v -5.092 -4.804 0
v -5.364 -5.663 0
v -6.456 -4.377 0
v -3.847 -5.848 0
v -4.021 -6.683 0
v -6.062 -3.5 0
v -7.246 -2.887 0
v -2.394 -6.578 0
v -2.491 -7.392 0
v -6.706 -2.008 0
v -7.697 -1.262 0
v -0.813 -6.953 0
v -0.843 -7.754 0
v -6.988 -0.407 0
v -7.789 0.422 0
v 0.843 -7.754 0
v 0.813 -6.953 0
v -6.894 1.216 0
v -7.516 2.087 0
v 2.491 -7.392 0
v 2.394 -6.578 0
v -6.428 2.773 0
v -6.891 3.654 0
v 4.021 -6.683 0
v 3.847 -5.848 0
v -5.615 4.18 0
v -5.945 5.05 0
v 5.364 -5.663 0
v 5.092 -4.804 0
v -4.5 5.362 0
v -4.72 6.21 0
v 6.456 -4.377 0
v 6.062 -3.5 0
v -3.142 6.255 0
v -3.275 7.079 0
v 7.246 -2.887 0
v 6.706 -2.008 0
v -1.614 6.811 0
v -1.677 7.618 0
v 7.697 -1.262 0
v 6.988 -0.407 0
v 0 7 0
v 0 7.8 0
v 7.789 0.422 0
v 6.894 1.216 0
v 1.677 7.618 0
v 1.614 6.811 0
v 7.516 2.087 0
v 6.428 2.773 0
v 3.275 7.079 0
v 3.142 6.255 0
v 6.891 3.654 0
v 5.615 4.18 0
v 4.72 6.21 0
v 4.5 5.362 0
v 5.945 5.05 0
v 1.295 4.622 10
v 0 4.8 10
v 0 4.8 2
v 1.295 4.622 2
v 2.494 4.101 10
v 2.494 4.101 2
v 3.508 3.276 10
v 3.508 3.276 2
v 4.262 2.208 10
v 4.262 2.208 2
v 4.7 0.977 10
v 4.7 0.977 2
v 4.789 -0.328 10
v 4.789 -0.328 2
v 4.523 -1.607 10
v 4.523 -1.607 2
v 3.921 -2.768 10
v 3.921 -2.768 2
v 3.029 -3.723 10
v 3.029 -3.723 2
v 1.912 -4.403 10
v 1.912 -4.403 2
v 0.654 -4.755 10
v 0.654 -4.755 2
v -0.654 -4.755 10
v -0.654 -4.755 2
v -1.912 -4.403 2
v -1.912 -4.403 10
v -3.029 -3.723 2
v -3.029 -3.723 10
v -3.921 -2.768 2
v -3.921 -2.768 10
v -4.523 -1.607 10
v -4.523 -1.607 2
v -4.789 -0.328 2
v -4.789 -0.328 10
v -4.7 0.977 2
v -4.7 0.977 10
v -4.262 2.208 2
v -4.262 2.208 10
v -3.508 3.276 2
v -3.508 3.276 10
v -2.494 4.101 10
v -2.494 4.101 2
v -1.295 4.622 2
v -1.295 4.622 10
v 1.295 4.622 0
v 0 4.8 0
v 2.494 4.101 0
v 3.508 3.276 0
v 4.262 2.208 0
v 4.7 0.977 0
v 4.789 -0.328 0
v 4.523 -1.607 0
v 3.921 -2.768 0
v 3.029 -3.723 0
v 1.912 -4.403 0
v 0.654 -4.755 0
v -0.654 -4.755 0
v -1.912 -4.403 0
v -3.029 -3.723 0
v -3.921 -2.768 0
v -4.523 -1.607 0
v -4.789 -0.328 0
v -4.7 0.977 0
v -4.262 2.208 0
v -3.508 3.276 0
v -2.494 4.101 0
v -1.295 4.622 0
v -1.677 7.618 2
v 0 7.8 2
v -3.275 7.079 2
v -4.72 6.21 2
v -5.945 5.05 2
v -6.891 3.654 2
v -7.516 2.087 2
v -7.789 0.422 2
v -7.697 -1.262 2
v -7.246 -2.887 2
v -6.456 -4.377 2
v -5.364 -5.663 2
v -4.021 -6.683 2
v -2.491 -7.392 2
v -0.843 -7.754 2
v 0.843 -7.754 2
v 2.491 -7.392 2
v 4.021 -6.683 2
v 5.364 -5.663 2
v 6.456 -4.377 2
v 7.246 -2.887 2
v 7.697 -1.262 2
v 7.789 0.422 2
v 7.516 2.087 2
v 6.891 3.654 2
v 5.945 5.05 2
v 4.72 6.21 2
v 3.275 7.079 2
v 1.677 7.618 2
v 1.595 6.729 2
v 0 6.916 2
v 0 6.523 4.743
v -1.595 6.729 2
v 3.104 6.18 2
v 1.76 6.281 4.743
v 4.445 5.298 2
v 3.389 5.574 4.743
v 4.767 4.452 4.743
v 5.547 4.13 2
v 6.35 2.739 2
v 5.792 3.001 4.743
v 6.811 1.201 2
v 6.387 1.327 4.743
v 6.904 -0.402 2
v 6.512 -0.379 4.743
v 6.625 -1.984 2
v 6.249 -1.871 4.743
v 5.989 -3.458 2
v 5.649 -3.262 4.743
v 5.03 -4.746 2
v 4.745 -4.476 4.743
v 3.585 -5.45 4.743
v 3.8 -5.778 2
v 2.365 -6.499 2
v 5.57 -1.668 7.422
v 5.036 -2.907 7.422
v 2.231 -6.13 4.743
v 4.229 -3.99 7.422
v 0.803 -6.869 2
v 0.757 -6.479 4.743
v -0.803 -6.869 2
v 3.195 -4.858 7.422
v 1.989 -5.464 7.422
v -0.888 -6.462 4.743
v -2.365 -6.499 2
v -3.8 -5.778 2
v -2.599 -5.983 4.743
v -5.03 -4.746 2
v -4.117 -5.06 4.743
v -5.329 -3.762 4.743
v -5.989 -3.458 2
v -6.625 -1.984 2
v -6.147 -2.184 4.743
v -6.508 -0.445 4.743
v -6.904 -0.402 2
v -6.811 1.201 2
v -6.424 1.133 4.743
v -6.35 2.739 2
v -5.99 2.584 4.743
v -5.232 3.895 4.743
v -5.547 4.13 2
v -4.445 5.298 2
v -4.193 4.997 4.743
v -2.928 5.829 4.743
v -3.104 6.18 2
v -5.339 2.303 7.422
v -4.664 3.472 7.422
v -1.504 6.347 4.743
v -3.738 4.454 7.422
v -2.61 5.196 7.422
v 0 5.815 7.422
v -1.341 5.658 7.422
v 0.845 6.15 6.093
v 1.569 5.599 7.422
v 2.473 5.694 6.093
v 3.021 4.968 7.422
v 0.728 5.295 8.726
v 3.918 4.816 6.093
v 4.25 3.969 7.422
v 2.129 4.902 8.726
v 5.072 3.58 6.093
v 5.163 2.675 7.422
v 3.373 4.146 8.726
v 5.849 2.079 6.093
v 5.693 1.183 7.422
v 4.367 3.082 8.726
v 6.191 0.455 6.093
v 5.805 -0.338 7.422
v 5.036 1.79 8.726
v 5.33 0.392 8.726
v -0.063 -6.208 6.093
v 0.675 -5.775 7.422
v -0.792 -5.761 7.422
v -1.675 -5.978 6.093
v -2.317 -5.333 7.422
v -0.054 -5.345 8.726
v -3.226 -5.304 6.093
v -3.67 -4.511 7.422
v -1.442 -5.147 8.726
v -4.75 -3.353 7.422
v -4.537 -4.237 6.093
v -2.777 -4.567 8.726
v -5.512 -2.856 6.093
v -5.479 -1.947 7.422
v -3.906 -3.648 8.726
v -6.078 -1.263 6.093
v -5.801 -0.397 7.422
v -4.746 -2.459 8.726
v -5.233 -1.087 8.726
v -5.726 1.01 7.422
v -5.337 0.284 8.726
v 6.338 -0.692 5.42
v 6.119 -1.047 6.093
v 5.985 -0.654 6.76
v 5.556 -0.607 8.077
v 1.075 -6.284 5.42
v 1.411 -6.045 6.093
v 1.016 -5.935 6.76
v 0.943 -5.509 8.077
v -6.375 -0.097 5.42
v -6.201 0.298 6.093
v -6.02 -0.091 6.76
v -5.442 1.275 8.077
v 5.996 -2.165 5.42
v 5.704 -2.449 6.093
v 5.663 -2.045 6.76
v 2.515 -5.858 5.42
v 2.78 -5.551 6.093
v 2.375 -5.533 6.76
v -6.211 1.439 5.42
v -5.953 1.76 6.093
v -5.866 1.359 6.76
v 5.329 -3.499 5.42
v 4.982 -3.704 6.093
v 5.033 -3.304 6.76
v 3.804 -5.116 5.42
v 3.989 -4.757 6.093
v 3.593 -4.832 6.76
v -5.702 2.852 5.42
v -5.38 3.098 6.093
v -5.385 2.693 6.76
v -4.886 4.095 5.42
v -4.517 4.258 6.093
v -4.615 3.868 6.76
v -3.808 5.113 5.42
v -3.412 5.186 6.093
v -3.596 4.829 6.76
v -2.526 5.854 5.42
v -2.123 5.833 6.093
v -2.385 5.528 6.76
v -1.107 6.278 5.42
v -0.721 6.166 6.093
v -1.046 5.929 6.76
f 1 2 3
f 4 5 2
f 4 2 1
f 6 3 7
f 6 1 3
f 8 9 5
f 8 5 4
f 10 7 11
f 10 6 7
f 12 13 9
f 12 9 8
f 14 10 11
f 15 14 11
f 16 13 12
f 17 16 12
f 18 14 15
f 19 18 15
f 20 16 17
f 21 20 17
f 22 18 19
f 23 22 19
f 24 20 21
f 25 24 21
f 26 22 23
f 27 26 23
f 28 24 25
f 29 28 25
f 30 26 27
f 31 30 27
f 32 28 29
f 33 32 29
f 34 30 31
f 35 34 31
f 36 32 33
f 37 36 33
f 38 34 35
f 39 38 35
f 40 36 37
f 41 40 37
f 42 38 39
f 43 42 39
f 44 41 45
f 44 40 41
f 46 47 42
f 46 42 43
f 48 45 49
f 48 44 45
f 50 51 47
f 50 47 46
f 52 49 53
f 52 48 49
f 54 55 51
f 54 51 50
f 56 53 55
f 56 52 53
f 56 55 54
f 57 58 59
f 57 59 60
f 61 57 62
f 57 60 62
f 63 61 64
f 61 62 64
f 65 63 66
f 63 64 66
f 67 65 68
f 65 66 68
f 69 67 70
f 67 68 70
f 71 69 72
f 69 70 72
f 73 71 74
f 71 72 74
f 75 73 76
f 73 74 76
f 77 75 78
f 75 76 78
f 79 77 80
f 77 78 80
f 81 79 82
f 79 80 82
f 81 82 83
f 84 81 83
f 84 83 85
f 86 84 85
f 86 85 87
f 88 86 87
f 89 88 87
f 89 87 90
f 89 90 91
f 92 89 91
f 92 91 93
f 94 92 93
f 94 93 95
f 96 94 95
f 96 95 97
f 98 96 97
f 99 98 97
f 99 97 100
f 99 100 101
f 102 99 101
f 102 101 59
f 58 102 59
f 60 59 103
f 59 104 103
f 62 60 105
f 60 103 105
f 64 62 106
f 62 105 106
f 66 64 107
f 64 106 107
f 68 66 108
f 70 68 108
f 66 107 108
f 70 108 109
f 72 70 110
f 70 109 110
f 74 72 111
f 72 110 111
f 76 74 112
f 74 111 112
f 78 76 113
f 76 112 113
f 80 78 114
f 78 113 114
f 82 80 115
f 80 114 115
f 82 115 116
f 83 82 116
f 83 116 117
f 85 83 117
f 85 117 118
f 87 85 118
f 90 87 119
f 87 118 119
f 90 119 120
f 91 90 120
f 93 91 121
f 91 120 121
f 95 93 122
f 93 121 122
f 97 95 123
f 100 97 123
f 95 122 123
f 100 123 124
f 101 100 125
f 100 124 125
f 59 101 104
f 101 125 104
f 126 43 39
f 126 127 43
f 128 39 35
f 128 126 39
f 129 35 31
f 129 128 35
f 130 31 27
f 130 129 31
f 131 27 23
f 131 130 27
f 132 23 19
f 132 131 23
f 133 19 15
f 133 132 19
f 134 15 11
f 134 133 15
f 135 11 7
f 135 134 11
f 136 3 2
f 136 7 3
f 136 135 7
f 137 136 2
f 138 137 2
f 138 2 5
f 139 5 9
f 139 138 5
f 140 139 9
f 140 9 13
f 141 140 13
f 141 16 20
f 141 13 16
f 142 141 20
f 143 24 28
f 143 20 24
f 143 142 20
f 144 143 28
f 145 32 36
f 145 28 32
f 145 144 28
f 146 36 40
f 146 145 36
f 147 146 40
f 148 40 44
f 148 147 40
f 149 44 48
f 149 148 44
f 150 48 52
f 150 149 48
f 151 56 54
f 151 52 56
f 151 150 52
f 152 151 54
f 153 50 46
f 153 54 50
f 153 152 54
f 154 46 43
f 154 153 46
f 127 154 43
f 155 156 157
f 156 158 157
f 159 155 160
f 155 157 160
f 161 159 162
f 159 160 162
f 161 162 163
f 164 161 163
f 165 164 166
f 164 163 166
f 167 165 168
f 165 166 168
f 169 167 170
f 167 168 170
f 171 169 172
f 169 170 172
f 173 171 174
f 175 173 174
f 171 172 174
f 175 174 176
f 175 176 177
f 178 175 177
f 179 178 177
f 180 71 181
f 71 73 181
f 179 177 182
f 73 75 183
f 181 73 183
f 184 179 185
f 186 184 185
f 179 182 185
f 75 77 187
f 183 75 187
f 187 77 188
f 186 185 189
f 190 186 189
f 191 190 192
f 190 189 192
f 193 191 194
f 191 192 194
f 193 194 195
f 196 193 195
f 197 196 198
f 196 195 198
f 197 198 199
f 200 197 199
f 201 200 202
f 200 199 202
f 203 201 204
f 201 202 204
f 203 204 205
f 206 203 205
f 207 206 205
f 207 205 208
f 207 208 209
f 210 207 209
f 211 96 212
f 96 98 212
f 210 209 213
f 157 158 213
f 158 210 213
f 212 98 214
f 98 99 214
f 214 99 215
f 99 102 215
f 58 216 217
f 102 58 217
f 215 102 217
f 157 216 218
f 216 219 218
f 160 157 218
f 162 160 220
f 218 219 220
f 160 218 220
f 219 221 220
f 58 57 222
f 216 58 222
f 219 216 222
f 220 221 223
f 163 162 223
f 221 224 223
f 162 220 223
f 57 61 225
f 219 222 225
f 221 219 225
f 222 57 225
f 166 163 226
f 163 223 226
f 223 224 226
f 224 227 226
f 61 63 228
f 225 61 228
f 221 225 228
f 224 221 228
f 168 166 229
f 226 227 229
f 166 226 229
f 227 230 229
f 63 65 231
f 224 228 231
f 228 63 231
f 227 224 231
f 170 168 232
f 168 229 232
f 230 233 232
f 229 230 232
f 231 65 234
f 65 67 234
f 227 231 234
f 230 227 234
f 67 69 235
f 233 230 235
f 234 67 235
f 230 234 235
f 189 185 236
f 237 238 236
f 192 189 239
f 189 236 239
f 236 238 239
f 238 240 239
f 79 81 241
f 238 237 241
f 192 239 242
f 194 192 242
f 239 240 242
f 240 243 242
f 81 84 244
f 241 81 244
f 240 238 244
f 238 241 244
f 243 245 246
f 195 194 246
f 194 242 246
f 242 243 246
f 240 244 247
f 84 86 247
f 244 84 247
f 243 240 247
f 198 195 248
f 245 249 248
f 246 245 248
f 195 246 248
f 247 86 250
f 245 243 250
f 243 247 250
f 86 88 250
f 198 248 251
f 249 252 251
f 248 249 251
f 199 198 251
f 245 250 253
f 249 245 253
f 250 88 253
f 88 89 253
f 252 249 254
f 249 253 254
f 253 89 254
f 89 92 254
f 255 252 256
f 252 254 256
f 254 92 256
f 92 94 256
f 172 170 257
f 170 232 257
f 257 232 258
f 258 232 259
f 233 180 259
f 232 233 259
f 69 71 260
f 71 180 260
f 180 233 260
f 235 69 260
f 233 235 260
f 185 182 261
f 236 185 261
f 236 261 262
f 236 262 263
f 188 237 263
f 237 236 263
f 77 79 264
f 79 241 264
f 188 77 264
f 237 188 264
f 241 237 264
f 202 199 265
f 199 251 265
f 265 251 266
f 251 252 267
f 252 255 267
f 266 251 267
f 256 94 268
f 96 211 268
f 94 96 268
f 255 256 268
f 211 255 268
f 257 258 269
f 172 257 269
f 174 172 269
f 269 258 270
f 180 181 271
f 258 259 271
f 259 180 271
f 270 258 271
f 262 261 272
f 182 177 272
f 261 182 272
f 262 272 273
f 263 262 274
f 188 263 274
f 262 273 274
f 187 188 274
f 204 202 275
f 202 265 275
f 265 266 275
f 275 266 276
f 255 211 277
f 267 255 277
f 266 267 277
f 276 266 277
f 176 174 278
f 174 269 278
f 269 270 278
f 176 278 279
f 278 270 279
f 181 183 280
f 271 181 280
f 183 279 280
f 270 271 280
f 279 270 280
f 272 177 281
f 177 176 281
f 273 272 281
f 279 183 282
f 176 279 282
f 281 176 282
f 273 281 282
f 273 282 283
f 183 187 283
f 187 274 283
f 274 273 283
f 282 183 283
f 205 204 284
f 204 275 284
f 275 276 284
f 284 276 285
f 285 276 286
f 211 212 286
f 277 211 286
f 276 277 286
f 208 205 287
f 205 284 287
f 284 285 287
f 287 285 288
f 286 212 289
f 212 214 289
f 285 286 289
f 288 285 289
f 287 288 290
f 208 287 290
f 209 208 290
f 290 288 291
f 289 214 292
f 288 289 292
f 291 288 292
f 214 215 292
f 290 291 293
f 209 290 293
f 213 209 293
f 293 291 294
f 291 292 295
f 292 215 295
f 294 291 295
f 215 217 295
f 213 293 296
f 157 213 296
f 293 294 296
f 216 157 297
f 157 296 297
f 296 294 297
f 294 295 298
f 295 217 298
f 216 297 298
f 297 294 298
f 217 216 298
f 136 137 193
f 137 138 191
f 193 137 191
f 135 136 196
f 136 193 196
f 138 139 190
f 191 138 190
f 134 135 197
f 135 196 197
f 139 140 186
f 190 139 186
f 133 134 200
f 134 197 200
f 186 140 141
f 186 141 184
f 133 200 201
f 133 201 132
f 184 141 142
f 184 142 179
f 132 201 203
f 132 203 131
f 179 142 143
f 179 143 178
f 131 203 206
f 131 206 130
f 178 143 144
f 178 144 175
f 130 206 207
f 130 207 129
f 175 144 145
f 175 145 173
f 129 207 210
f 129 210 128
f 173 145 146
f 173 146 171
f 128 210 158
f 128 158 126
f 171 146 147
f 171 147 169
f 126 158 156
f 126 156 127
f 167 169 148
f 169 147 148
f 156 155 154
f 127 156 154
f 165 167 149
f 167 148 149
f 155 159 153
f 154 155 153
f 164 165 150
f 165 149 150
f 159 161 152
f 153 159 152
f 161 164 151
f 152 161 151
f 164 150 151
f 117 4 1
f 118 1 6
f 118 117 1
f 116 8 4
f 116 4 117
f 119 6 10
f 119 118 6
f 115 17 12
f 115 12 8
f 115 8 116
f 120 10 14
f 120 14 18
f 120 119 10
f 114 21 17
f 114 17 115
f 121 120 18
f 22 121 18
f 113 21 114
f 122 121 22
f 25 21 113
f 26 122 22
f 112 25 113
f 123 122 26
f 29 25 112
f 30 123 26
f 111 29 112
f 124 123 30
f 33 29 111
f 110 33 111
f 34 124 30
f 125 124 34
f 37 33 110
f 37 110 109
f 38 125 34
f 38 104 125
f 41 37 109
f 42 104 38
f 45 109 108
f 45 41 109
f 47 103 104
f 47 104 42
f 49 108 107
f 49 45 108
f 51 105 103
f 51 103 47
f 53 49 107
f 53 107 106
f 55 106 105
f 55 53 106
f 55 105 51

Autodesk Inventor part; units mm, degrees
ref_plane "YZ Plane" through (0, 0, 0) normal (1, 0, 0) x (0, 1, 0)
ref_plane "XZ Plane" through (0, 0, 0) normal (0, 1, 0) x (-1, 0, 0)
ref_plane "XY Plane" through (0, 0, 0) normal (0, 0, 1) x (1, 0, 0)
sketch "Sketch1" plane through (0, 0, 0) normal (1, 0, 0) x (0, 1, 0)
  line L0 (0, 0) -> (7, 0) construction
  arc A0 (7, 0) -> (4.8, 10) centre (-16.8273, 0) ccw
  line L1 (0, 3.5) -> (0, 0) construction
  line L2 (4.8, 10) -> (4.8, 10)
  line L3 (7, 0) -> (4.8, 0)
  line L4 (4.8, 10) -> (4.8, 0)
  line L5 (4.8, 0) -> (7.8, 0)
  line L6 (7.8, 0) -> (7.8, 2)
  line L7 (7.8, 2) -> (4.8, 2)
  line L8 (4.8, 2) -> (4.8, 0)
  point P0 (0, 6.2097)
  dimension "d1" = 7
  dimension "d10" = 10
  dimension "d11" = 0
  dimension "d12" = 4.8
  dimension "d13" = 2
  dimension "d14" = 3
revolve "Revolution1" add sketch "Sketch1" angle 360 about axis through (0, 0, 3.5) along (0, 0, -1)
properties part number "brush fitting partb"
